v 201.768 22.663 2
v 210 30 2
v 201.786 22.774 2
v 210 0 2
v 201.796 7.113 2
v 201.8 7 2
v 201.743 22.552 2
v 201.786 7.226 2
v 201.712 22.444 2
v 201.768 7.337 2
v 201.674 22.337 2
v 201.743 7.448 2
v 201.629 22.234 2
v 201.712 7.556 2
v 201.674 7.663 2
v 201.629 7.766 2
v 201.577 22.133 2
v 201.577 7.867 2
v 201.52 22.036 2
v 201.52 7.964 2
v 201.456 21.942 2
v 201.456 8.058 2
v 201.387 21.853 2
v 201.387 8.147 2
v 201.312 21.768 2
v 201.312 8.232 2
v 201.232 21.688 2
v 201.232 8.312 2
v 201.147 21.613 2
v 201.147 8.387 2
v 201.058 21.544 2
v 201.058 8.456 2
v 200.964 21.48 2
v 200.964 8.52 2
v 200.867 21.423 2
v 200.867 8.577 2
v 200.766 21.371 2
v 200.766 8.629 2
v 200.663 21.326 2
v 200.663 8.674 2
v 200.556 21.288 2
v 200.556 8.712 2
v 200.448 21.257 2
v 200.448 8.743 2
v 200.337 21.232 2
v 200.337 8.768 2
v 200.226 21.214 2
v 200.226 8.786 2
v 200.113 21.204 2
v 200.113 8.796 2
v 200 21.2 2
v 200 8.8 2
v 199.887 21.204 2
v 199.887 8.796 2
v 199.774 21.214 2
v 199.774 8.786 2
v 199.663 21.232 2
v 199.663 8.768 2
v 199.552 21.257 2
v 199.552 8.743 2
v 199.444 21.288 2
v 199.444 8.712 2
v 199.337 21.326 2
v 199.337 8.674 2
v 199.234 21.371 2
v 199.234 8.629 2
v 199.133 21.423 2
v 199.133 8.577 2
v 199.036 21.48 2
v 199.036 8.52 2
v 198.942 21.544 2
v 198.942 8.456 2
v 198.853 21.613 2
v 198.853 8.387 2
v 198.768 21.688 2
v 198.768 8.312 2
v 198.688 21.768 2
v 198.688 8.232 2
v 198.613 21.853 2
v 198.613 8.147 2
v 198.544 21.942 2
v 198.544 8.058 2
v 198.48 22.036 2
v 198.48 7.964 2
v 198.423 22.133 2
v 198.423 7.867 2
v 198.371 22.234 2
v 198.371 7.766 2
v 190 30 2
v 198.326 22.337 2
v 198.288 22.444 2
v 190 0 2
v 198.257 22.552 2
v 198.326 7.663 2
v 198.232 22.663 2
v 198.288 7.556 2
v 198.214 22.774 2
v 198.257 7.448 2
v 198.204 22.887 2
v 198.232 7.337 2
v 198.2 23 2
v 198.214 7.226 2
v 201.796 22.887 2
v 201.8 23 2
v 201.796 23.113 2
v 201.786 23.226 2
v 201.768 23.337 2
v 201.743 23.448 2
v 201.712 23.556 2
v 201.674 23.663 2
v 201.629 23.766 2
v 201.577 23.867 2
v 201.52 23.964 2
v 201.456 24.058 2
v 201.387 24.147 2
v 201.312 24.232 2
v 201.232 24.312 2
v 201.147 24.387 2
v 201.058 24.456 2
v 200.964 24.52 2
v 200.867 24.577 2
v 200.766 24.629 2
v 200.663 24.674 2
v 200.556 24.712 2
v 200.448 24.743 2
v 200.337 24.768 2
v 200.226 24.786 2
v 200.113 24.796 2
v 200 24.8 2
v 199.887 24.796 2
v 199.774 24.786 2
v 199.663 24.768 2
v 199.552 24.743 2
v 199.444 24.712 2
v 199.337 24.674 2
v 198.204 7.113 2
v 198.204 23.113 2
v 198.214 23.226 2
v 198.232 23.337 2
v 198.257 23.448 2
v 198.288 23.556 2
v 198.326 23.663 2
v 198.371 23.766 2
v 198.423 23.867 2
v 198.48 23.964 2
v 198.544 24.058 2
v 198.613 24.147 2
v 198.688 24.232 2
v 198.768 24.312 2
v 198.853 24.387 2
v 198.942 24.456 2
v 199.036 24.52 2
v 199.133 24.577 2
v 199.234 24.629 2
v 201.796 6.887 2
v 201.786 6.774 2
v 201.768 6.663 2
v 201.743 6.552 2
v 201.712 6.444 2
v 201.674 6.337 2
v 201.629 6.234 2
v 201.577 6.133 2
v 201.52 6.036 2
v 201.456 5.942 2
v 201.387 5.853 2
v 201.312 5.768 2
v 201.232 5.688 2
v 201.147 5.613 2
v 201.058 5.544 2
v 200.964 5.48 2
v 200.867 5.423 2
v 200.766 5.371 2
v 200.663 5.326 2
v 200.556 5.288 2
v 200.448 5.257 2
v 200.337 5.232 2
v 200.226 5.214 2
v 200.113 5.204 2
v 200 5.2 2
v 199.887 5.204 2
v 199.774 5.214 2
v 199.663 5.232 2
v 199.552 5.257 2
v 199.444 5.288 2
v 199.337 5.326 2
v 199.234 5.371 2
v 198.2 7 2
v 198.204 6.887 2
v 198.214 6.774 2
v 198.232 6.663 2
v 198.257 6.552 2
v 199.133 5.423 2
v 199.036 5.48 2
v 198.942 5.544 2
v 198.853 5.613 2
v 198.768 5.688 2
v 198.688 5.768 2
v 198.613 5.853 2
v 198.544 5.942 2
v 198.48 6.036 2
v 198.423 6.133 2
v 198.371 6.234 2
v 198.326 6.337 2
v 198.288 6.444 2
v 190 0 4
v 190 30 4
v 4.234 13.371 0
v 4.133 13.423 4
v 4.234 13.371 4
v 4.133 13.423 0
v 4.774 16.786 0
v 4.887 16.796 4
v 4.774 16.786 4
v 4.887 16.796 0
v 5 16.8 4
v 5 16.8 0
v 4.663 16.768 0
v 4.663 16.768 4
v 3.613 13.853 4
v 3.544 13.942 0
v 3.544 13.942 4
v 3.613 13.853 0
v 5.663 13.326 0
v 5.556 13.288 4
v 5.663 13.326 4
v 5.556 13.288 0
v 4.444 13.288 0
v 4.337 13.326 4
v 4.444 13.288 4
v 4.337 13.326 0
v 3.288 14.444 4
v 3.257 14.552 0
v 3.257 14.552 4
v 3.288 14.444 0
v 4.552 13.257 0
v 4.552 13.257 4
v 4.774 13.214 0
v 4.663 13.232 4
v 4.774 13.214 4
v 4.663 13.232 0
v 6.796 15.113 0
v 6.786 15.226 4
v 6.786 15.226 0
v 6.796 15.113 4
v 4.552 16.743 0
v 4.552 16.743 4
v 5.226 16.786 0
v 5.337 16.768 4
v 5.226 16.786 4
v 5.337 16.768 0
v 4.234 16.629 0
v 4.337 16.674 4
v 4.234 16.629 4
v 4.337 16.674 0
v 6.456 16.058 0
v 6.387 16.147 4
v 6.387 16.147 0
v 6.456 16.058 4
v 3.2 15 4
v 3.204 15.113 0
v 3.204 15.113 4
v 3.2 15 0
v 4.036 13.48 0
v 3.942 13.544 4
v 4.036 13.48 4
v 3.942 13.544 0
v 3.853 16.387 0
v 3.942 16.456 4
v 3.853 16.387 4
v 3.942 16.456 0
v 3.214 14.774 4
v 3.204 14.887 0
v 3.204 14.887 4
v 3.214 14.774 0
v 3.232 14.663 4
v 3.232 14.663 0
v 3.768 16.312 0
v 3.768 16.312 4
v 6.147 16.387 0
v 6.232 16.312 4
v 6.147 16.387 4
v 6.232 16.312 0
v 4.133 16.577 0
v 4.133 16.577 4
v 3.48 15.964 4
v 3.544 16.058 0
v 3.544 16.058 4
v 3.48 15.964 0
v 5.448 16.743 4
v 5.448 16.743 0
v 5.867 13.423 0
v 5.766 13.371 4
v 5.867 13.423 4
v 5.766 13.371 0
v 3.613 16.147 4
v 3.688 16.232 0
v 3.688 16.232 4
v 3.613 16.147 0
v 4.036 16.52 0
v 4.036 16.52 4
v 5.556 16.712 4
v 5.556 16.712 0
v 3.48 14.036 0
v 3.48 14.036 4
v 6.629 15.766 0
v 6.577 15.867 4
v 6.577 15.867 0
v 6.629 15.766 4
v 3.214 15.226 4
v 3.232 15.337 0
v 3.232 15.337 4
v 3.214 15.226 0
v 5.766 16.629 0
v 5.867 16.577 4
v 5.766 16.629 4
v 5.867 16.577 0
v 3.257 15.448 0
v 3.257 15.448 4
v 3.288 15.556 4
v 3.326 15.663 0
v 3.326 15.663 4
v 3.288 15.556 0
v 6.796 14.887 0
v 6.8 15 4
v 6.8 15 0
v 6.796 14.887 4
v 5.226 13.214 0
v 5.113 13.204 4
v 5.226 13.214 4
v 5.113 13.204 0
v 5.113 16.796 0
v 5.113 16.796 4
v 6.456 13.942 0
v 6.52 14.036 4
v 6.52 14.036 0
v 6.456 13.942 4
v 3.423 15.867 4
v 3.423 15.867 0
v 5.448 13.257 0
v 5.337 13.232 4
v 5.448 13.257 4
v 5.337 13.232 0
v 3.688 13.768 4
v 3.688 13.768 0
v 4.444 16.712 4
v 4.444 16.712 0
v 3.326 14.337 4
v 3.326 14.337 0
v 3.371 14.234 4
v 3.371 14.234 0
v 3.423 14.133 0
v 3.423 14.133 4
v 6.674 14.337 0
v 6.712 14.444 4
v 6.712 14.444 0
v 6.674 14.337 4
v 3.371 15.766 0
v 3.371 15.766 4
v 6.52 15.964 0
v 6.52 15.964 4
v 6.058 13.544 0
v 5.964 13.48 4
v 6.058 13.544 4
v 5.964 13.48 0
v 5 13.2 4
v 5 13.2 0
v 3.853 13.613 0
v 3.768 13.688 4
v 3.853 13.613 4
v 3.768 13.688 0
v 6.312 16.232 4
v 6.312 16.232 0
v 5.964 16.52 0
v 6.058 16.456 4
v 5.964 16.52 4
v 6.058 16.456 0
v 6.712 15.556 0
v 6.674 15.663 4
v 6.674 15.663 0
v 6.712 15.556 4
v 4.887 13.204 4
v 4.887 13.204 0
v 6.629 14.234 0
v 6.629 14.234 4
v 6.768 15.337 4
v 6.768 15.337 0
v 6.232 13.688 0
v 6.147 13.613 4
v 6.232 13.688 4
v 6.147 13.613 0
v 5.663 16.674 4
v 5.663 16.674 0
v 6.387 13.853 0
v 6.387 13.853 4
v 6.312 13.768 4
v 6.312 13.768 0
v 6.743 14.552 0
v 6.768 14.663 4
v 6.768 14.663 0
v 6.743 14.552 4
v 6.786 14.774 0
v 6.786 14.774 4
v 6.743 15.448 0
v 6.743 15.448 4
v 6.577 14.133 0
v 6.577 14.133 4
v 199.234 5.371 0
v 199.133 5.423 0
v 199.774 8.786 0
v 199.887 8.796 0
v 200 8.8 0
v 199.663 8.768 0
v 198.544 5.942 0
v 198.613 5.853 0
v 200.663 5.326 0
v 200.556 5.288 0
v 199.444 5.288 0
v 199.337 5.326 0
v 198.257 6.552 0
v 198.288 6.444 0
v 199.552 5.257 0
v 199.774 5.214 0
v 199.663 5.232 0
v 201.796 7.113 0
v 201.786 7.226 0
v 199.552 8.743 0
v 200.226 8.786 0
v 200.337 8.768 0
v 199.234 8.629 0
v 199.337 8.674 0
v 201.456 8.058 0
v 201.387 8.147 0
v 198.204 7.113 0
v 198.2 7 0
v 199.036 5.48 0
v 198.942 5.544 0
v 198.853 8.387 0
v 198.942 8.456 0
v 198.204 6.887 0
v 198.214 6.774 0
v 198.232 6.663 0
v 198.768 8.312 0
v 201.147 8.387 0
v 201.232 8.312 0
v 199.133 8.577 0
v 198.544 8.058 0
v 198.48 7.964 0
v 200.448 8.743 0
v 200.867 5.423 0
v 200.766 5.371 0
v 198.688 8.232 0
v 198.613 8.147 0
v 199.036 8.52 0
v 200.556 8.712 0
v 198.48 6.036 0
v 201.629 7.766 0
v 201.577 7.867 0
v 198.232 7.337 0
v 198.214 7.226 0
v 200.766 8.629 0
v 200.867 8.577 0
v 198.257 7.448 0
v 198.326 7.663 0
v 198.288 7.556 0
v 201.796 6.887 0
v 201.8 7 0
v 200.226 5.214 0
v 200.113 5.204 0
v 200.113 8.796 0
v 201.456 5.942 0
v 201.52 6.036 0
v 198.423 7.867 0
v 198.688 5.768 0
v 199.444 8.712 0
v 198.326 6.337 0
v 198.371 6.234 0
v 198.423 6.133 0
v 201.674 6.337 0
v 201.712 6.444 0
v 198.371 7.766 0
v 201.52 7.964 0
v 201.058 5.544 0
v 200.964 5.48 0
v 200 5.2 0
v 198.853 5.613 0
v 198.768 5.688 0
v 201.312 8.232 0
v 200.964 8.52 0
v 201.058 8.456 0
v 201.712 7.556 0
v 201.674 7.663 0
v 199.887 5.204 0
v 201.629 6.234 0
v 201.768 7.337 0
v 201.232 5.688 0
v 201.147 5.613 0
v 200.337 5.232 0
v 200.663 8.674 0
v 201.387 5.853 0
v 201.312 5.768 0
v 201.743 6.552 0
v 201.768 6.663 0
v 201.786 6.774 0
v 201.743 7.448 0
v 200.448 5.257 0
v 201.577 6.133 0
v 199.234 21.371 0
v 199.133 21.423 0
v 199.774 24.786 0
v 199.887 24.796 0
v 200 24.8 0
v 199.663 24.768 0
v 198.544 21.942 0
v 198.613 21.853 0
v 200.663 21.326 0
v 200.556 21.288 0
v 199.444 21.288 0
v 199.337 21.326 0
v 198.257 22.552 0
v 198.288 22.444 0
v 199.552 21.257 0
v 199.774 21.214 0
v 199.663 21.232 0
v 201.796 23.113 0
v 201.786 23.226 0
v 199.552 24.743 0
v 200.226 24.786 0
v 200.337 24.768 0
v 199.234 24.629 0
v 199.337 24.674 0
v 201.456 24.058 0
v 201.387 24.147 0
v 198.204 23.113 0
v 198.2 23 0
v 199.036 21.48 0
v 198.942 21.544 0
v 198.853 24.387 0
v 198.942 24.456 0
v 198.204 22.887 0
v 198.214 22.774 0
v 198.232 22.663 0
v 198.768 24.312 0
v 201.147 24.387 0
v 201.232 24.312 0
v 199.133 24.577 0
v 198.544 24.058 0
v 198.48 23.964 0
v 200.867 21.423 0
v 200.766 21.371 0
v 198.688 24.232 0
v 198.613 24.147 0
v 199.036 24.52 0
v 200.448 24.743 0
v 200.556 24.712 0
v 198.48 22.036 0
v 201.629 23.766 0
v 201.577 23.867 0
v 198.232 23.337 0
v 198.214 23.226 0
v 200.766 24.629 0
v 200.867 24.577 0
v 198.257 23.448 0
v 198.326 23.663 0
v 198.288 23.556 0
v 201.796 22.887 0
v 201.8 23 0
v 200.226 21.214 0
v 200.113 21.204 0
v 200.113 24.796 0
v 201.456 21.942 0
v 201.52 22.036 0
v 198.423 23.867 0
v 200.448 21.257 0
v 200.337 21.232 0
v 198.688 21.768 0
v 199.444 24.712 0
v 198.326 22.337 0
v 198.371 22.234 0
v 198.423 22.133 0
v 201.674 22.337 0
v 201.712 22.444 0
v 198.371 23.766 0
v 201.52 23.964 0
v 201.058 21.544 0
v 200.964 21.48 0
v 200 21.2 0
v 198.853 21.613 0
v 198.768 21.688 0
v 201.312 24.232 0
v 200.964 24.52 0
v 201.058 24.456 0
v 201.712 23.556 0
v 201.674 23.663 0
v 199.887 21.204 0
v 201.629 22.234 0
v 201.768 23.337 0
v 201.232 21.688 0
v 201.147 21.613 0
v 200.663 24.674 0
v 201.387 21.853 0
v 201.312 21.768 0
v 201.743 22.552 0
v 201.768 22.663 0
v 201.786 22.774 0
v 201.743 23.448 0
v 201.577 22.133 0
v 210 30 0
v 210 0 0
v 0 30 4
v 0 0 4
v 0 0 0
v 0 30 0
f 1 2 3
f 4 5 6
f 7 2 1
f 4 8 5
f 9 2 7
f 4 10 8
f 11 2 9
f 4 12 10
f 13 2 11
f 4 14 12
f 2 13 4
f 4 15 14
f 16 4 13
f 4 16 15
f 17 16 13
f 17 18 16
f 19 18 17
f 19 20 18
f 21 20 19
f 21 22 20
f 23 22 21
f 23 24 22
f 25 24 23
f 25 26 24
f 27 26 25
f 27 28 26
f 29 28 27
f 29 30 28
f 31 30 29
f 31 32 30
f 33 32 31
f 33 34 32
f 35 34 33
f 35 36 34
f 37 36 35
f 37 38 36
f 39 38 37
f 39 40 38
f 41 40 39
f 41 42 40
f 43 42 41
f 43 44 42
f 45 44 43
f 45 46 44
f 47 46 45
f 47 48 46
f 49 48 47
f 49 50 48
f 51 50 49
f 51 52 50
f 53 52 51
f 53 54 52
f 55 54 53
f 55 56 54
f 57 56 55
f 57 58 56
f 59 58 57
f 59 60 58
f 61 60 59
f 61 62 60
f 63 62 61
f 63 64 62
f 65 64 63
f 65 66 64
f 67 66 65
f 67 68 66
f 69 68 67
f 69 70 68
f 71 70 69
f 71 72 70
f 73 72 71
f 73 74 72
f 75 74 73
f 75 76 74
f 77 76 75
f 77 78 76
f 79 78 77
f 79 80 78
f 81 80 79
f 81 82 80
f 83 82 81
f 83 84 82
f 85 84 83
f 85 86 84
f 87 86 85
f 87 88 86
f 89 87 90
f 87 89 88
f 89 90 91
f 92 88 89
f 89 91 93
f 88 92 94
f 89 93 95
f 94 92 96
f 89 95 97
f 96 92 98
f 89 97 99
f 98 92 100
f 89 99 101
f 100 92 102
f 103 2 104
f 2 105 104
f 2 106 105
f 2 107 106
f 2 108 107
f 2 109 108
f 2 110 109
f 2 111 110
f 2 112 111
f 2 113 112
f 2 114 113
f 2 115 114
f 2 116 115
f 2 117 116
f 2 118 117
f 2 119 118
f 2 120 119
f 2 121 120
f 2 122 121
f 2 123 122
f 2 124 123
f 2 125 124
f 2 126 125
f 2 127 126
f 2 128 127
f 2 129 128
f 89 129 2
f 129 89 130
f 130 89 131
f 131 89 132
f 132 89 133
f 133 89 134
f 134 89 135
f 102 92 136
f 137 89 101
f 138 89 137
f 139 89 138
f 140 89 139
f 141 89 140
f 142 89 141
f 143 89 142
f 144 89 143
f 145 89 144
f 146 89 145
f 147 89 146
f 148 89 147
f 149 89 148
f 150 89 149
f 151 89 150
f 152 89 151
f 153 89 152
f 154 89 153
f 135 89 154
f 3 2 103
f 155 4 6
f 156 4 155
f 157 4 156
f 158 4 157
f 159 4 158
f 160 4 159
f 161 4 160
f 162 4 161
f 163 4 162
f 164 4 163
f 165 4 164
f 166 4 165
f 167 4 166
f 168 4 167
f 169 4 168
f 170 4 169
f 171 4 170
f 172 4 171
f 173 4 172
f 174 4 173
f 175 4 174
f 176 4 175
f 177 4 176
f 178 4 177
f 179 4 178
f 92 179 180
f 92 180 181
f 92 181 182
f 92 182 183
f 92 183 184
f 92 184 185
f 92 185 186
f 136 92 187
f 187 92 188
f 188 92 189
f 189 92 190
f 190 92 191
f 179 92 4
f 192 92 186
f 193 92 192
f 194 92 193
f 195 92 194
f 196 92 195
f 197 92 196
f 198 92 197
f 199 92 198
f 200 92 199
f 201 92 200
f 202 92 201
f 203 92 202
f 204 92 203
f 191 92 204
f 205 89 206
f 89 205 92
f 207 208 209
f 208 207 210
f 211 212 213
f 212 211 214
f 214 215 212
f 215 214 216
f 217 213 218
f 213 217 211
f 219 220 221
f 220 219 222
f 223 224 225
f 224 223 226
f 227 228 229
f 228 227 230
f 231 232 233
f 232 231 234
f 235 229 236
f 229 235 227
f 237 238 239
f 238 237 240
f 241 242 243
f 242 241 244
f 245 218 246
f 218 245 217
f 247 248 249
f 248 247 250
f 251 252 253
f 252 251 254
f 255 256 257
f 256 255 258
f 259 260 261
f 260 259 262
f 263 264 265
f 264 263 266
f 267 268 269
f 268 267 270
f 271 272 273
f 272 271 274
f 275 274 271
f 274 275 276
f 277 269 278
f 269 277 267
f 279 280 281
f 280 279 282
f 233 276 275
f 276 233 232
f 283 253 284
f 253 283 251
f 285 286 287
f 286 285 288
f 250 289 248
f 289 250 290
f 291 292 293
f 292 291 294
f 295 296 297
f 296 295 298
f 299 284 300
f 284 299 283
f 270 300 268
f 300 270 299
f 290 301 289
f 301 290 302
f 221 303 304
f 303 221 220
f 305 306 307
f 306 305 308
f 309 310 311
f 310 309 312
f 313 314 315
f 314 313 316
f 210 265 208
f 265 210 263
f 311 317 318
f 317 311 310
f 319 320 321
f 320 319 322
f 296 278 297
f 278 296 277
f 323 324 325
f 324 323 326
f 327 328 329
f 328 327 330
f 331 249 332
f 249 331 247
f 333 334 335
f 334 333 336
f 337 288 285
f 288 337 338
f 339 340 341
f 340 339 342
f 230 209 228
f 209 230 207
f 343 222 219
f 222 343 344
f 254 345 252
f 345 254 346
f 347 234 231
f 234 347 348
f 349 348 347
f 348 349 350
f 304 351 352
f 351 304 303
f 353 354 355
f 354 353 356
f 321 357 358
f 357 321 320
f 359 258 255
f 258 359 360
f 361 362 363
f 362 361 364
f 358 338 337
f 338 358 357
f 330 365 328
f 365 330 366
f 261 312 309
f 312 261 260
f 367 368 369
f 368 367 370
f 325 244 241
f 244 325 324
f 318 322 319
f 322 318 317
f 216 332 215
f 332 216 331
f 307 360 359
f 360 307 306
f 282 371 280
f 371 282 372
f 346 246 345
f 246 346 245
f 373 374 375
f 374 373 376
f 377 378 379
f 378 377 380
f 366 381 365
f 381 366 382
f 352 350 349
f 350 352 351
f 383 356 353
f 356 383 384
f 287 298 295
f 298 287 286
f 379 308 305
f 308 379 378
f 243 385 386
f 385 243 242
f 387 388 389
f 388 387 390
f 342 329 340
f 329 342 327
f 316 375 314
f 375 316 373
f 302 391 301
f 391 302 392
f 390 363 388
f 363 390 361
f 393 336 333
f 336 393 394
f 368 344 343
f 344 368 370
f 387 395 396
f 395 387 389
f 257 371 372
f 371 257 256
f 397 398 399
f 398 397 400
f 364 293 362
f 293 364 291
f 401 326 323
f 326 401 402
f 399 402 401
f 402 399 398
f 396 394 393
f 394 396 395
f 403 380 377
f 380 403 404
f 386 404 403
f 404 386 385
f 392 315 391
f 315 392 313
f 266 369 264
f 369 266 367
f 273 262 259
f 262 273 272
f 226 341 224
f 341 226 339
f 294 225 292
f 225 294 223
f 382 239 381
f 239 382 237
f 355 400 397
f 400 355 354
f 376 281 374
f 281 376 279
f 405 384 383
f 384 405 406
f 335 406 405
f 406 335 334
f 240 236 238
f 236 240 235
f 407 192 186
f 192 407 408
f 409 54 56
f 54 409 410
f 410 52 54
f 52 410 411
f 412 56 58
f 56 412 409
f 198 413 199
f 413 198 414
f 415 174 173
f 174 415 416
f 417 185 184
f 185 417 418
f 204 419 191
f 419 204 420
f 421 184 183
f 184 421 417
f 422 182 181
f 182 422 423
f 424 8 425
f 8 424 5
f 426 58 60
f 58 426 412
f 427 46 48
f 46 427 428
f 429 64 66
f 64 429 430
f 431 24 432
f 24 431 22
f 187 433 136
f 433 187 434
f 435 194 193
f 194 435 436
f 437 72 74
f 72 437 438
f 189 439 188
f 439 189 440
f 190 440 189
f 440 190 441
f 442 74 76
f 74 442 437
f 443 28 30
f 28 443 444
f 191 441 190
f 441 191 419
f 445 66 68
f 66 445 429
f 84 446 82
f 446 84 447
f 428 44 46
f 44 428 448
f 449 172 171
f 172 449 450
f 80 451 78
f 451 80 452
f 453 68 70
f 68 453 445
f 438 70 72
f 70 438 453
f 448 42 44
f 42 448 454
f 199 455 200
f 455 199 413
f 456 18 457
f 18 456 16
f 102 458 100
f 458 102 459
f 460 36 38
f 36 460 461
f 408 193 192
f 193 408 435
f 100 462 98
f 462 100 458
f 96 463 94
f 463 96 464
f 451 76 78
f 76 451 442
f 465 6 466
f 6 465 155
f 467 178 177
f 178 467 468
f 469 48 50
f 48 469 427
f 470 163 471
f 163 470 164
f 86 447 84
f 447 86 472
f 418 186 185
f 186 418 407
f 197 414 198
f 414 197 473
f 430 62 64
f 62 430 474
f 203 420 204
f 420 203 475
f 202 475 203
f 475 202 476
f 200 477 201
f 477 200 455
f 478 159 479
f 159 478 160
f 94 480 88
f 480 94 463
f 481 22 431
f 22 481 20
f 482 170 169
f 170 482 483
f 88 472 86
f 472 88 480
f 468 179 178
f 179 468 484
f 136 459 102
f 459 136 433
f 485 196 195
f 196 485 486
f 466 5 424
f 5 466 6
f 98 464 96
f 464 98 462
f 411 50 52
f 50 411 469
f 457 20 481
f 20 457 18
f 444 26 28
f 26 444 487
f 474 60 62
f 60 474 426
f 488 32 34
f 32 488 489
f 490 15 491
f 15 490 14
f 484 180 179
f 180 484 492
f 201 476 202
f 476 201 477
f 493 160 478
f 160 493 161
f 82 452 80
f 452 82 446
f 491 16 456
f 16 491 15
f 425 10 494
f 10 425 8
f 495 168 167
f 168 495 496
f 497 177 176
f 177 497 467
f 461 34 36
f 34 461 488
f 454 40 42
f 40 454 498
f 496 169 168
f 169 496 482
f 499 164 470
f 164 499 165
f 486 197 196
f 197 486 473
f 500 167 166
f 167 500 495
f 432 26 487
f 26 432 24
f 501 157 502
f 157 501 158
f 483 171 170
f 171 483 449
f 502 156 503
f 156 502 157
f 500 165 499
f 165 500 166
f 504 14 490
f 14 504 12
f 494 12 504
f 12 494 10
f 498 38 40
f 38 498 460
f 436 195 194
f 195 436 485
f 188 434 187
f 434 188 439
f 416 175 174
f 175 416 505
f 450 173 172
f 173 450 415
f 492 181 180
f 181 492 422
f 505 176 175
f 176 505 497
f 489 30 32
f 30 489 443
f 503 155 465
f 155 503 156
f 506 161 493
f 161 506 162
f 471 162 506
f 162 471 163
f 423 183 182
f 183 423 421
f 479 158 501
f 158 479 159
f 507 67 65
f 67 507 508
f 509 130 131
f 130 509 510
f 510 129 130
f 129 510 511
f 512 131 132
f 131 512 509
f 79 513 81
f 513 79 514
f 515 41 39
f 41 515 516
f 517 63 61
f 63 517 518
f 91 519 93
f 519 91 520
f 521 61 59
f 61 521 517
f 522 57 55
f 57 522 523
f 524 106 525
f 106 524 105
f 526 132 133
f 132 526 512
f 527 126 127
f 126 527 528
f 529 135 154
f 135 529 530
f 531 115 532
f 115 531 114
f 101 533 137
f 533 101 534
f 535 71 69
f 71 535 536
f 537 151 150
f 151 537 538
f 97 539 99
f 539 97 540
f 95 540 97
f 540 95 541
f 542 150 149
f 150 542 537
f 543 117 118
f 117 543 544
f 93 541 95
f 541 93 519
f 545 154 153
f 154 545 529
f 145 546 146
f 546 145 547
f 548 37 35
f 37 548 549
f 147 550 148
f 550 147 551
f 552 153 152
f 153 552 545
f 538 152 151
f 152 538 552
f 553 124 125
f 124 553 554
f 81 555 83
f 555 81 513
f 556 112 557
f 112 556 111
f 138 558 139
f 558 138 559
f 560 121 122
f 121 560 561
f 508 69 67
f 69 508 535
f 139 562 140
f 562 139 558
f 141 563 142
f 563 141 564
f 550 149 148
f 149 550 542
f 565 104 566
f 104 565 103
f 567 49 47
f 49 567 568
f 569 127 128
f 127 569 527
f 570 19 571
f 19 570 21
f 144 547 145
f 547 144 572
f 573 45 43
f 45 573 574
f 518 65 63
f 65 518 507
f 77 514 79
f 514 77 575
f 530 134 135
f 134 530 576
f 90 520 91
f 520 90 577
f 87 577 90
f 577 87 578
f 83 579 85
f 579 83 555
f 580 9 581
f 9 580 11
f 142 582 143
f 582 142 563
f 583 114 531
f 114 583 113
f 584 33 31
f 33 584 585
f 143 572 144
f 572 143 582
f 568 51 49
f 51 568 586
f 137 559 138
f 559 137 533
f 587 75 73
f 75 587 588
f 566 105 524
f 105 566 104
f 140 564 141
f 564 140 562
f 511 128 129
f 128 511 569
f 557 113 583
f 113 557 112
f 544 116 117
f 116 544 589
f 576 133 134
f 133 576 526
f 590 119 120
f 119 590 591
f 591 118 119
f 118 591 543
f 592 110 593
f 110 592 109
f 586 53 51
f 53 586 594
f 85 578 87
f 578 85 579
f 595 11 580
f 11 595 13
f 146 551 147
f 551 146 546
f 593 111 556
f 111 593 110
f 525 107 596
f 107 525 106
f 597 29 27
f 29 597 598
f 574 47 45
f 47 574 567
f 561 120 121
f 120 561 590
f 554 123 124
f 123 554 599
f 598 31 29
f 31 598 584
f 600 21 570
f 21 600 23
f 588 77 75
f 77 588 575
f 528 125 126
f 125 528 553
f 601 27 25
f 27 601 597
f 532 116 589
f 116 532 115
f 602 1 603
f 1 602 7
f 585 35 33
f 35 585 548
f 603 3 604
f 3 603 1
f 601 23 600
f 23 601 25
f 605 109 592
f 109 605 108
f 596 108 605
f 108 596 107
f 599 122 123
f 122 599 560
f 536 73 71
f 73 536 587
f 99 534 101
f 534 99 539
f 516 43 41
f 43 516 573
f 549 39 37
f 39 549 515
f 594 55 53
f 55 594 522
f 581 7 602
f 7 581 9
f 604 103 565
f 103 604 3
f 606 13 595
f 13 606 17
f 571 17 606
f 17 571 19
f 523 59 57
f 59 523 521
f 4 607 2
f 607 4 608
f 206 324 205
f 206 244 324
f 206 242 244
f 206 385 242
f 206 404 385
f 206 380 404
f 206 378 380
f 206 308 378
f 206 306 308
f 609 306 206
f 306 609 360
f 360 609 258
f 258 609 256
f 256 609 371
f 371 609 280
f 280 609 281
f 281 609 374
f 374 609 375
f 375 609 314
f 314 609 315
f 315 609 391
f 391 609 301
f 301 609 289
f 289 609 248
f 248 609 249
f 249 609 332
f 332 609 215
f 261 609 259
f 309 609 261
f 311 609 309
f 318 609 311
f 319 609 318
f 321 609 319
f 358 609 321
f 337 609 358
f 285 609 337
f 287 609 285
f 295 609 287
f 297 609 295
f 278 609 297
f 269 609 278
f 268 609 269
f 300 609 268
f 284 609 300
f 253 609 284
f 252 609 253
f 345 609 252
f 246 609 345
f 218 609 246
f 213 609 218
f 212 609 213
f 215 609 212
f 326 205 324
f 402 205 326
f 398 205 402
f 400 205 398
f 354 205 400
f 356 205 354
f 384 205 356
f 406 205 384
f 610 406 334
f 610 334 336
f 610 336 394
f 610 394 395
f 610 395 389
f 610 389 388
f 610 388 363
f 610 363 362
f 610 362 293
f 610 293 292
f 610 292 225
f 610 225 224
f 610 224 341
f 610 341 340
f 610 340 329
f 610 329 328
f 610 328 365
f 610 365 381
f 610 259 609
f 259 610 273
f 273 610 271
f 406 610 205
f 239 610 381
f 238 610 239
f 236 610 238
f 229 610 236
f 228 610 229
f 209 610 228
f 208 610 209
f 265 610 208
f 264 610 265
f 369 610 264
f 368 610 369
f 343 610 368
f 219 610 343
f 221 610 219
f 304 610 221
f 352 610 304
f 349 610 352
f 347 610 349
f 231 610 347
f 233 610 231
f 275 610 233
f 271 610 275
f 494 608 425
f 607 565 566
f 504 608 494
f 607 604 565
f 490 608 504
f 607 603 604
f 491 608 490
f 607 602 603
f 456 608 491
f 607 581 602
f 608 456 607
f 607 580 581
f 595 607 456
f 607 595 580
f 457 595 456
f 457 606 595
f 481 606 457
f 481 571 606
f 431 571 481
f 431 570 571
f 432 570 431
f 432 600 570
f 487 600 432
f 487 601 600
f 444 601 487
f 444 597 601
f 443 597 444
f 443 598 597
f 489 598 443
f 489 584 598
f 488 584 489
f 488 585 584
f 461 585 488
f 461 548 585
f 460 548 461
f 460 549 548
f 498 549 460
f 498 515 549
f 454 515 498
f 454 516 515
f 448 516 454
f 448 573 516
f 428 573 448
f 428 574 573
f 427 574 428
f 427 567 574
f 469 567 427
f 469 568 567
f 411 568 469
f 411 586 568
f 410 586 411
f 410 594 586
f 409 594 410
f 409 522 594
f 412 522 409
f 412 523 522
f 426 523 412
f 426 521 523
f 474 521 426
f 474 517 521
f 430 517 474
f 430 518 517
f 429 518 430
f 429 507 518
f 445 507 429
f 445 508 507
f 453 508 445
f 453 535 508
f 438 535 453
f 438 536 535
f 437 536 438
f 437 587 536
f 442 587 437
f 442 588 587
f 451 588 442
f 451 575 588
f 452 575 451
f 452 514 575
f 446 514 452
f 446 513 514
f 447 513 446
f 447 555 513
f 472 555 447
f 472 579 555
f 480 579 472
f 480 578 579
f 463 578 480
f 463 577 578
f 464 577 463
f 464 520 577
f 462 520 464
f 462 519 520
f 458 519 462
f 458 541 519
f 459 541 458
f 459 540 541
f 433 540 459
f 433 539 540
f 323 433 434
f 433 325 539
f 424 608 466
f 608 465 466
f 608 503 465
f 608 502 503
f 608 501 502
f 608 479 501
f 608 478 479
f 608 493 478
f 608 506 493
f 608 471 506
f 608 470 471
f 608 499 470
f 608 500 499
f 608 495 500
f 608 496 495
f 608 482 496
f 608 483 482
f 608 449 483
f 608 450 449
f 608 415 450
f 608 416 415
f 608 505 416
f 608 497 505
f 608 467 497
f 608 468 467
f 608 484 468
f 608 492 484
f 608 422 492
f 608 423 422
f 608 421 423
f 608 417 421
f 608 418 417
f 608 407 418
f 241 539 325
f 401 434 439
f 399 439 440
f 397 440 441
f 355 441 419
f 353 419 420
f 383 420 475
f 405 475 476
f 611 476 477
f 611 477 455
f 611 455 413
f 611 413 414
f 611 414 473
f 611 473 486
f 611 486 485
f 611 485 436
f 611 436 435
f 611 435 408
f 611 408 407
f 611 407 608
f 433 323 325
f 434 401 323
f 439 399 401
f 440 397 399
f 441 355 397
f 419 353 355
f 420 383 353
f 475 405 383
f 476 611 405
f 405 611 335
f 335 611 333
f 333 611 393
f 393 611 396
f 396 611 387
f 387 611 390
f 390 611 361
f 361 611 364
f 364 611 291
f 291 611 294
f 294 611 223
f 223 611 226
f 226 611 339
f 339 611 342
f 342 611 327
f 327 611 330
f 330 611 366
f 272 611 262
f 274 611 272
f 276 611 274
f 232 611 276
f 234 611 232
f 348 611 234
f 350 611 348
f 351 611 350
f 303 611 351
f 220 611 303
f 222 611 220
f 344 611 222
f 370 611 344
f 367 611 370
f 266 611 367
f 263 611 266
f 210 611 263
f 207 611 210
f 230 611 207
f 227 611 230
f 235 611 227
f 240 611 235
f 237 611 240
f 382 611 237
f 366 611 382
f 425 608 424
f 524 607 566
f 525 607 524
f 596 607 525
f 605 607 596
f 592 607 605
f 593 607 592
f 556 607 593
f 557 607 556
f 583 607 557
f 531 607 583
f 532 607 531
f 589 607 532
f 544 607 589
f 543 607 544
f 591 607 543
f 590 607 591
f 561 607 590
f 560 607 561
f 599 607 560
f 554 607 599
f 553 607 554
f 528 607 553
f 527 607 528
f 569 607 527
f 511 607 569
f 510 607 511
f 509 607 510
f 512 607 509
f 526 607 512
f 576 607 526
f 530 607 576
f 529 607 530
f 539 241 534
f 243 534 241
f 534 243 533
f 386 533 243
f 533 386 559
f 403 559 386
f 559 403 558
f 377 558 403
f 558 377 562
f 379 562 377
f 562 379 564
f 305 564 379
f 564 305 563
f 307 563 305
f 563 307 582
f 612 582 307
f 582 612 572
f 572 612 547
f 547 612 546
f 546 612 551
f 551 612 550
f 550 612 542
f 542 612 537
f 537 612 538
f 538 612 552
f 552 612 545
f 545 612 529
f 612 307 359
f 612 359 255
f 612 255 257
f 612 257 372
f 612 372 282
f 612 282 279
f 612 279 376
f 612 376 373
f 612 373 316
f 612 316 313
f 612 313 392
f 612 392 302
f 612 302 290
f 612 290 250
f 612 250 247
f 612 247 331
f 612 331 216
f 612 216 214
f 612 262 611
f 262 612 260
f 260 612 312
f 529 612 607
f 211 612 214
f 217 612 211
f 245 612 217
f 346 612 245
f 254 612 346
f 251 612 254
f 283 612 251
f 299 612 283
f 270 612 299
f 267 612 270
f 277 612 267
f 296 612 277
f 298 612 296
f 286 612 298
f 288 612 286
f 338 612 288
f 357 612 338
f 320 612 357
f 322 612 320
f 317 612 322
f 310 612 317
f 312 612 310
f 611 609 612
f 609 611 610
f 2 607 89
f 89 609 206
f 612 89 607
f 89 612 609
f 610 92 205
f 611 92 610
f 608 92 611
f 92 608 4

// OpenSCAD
lengte = 210;
difference(){
	union(){
        
       translate([0,0,0]){
           cube([lengte,30,4], center=false);
       }


	}
	union() {

       translate([lengte-20,-10,2]){
           cube([30,50,4], center=false);
       }


       translate([5,15,-2]){
            rotate(a = [0,0,90]) {
              cylinder(h=600, r=1.8, $fn=100, center=false);
            }
       }	



       translate([lengte-10,15-8,-2]){
            rotate(a = [0,0,90]) {
              cylinder(h=600, r=1.8, $fn=100, center=false);
            }
       }	
       translate([lengte-10,15+8,-2]){
            rotate(a = [0,0,90]) {
              cylinder(h=600, r=1.8, $fn=100, center=false);
            }
       }	


        
	}
}
